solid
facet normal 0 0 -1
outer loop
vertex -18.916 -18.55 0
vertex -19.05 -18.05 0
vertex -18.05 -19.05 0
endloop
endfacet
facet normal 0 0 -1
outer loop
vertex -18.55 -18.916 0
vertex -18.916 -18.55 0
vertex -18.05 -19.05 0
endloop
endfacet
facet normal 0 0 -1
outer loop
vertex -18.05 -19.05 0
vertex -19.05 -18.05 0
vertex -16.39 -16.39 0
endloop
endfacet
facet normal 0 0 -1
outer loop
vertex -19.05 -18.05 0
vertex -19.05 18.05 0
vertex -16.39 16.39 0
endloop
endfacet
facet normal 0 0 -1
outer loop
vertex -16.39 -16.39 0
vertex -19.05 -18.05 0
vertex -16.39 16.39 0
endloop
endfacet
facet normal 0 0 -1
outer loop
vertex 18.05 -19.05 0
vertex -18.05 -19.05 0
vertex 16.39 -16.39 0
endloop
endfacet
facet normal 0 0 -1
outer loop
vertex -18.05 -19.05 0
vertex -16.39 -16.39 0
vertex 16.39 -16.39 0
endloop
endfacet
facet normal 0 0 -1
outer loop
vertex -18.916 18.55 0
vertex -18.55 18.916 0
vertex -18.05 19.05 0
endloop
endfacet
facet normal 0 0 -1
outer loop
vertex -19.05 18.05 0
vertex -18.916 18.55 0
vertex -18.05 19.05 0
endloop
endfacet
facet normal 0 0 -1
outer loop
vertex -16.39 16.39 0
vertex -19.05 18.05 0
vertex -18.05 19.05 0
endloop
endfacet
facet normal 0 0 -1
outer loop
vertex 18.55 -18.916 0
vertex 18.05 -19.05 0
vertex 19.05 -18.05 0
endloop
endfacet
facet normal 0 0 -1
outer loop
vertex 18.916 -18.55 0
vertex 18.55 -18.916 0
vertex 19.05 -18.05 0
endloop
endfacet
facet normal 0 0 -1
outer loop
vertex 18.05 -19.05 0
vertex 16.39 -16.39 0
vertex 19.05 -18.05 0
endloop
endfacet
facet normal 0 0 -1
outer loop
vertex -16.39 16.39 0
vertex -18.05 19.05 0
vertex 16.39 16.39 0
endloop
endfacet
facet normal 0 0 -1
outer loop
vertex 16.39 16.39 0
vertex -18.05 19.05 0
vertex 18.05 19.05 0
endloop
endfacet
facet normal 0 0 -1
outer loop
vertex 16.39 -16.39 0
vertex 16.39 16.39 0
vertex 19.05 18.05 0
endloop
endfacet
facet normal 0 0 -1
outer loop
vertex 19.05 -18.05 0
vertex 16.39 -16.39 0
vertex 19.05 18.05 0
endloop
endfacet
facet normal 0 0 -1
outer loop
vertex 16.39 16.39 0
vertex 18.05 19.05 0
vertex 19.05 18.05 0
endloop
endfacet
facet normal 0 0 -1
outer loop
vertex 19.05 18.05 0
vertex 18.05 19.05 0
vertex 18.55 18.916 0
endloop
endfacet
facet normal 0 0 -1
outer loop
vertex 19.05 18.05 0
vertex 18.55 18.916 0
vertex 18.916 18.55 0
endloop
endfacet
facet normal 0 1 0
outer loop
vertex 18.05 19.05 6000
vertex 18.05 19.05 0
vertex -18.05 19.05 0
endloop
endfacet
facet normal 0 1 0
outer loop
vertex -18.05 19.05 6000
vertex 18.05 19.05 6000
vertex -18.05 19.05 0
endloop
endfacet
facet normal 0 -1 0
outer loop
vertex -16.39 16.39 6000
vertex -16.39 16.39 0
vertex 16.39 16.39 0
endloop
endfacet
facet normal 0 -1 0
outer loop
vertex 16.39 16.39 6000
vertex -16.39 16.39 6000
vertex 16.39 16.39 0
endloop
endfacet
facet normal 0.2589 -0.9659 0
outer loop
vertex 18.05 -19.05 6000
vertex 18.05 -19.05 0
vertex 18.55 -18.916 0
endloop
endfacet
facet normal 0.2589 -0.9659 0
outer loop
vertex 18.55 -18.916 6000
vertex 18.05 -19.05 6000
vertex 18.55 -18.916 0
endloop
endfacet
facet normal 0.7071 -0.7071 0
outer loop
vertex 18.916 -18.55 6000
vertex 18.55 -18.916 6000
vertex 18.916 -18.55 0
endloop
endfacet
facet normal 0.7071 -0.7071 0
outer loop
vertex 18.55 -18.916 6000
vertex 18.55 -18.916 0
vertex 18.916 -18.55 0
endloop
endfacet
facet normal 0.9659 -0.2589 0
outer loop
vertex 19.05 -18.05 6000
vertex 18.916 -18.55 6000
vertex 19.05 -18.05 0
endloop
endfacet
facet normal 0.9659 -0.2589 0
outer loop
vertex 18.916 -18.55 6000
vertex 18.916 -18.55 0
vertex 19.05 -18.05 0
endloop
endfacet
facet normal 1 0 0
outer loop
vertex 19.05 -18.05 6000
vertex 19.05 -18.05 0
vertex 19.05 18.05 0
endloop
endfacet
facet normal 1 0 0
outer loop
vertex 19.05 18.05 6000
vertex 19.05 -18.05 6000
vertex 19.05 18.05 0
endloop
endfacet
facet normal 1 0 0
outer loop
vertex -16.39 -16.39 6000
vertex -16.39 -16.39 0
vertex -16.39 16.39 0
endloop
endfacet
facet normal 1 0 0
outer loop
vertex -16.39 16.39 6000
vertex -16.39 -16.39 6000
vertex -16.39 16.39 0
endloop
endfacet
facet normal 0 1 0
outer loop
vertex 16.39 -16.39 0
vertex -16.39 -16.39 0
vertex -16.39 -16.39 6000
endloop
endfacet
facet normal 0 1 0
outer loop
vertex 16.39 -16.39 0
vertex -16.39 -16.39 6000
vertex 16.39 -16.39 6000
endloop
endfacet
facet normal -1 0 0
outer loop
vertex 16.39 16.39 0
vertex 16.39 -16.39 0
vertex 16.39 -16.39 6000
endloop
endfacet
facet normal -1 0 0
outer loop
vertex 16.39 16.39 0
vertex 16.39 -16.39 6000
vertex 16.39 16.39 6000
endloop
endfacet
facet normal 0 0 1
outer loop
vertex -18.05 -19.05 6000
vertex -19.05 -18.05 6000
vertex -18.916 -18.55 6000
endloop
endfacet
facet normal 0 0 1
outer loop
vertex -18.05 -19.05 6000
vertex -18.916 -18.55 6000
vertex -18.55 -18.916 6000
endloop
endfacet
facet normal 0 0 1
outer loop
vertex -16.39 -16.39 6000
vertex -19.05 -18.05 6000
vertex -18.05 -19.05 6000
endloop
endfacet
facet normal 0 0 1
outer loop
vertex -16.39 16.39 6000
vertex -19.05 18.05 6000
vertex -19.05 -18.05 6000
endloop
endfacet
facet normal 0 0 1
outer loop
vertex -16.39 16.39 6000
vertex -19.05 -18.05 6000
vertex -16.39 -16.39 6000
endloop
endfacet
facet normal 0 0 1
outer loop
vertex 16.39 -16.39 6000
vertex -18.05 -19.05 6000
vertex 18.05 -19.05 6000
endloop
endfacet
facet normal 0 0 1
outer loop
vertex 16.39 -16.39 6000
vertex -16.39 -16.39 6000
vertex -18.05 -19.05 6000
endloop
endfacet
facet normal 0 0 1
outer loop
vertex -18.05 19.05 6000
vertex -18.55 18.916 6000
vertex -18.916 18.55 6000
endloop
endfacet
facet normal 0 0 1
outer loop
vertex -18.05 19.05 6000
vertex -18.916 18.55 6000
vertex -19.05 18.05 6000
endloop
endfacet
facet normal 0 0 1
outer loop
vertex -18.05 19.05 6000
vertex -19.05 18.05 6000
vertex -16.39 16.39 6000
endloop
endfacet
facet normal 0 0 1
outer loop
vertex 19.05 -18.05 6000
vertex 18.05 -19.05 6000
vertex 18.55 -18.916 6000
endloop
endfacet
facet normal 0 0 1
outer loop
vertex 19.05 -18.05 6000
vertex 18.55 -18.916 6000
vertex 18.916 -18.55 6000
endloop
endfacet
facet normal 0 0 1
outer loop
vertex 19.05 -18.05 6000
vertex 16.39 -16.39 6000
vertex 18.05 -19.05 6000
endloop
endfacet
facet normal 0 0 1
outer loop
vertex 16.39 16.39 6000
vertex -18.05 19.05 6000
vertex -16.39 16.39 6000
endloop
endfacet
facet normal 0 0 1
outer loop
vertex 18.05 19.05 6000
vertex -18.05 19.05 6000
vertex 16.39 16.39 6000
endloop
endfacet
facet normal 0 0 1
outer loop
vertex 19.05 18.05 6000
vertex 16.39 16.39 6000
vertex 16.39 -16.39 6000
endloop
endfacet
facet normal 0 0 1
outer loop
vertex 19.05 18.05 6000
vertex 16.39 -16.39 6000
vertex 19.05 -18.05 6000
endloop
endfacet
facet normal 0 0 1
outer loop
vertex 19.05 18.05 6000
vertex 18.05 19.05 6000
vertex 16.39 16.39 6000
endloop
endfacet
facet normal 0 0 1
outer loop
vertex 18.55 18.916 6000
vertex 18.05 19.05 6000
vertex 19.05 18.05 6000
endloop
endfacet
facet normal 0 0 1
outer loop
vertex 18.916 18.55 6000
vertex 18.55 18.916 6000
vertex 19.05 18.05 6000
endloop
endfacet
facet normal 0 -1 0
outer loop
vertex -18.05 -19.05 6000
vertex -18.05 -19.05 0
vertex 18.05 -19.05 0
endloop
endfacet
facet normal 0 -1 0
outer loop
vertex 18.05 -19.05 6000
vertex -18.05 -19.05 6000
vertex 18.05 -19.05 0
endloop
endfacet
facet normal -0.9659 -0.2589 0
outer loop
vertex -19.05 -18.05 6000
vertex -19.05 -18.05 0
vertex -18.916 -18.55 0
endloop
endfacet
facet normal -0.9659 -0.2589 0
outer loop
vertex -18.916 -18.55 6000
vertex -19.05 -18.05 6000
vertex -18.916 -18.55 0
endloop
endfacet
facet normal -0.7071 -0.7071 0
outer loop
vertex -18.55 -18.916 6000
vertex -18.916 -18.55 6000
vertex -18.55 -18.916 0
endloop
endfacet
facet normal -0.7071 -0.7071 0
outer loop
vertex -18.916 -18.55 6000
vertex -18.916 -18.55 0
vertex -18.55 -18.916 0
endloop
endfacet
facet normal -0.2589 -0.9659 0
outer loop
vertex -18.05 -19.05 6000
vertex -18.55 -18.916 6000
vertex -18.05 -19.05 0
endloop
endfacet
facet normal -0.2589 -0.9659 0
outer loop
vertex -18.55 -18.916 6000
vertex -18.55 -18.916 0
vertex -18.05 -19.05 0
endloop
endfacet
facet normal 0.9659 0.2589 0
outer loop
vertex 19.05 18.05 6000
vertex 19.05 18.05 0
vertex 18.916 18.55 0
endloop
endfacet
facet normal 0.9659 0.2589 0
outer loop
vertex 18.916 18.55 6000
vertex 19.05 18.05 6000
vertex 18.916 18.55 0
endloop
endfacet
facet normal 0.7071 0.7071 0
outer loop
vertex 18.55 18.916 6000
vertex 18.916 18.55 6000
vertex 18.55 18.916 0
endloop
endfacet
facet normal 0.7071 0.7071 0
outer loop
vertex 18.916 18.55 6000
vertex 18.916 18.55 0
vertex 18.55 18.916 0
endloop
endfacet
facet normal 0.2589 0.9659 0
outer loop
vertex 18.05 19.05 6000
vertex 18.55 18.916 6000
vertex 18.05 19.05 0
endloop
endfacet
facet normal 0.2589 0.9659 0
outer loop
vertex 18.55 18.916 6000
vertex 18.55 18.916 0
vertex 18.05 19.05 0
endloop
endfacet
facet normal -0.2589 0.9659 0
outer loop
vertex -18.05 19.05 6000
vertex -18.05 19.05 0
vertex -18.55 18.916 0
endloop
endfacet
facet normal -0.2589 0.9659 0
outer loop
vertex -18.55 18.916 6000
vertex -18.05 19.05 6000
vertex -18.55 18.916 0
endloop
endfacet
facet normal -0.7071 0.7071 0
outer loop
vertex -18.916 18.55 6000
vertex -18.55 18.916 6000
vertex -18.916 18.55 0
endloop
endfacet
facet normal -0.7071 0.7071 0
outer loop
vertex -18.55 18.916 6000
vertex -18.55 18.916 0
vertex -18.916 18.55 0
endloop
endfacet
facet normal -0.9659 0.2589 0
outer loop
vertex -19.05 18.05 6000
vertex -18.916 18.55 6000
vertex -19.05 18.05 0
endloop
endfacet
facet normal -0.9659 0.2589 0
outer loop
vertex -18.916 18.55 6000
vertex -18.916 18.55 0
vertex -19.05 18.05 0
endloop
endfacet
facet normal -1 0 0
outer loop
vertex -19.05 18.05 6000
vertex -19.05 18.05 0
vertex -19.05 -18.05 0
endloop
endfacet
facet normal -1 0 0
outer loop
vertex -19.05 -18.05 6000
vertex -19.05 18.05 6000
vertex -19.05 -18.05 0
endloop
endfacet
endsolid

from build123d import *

# Parameters (mm, degrees)
CROQUIS1_W              = 32.78
CROQUIS1_H              = 32.78
SALIENTE_EXTRUIR1_DEPTH = 6000


with BuildPart() as part:
    # Croquis1 → Saliente-Extruir1 (new body)
    with BuildSketch(Plane.XY):
        with BuildLine():
            Line((-18.05, -19.05), (18.05, -19.05))
            ThreePointArc((18.05, -19.05), (18.757106781, -18.757106781), (19.05, -18.05))
            Line((19.05, -18.05), (19.05, 18.05))
            ThreePointArc((19.05, 18.05), (18.757106781, 18.757106781), (18.05, 19.05))
            Line((18.05, 19.05), (-18.05, 19.05))
            ThreePointArc((-18.05, 19.05), (-18.757106781, 18.757106781), (-19.05, 18.05))
            Line((-19.05, 18.05), (-19.05, -18.05))
            ThreePointArc((-19.05, -18.05), (-18.757106781, -18.757106781), (-18.05, -19.05))
        make_face()
        Rectangle(CROQUIS1_W, CROQUIS1_H, mode=Mode.SUBTRACT)
    extrude(amount=SALIENTE_EXTRUIR1_DEPTH)


solid = part.part
